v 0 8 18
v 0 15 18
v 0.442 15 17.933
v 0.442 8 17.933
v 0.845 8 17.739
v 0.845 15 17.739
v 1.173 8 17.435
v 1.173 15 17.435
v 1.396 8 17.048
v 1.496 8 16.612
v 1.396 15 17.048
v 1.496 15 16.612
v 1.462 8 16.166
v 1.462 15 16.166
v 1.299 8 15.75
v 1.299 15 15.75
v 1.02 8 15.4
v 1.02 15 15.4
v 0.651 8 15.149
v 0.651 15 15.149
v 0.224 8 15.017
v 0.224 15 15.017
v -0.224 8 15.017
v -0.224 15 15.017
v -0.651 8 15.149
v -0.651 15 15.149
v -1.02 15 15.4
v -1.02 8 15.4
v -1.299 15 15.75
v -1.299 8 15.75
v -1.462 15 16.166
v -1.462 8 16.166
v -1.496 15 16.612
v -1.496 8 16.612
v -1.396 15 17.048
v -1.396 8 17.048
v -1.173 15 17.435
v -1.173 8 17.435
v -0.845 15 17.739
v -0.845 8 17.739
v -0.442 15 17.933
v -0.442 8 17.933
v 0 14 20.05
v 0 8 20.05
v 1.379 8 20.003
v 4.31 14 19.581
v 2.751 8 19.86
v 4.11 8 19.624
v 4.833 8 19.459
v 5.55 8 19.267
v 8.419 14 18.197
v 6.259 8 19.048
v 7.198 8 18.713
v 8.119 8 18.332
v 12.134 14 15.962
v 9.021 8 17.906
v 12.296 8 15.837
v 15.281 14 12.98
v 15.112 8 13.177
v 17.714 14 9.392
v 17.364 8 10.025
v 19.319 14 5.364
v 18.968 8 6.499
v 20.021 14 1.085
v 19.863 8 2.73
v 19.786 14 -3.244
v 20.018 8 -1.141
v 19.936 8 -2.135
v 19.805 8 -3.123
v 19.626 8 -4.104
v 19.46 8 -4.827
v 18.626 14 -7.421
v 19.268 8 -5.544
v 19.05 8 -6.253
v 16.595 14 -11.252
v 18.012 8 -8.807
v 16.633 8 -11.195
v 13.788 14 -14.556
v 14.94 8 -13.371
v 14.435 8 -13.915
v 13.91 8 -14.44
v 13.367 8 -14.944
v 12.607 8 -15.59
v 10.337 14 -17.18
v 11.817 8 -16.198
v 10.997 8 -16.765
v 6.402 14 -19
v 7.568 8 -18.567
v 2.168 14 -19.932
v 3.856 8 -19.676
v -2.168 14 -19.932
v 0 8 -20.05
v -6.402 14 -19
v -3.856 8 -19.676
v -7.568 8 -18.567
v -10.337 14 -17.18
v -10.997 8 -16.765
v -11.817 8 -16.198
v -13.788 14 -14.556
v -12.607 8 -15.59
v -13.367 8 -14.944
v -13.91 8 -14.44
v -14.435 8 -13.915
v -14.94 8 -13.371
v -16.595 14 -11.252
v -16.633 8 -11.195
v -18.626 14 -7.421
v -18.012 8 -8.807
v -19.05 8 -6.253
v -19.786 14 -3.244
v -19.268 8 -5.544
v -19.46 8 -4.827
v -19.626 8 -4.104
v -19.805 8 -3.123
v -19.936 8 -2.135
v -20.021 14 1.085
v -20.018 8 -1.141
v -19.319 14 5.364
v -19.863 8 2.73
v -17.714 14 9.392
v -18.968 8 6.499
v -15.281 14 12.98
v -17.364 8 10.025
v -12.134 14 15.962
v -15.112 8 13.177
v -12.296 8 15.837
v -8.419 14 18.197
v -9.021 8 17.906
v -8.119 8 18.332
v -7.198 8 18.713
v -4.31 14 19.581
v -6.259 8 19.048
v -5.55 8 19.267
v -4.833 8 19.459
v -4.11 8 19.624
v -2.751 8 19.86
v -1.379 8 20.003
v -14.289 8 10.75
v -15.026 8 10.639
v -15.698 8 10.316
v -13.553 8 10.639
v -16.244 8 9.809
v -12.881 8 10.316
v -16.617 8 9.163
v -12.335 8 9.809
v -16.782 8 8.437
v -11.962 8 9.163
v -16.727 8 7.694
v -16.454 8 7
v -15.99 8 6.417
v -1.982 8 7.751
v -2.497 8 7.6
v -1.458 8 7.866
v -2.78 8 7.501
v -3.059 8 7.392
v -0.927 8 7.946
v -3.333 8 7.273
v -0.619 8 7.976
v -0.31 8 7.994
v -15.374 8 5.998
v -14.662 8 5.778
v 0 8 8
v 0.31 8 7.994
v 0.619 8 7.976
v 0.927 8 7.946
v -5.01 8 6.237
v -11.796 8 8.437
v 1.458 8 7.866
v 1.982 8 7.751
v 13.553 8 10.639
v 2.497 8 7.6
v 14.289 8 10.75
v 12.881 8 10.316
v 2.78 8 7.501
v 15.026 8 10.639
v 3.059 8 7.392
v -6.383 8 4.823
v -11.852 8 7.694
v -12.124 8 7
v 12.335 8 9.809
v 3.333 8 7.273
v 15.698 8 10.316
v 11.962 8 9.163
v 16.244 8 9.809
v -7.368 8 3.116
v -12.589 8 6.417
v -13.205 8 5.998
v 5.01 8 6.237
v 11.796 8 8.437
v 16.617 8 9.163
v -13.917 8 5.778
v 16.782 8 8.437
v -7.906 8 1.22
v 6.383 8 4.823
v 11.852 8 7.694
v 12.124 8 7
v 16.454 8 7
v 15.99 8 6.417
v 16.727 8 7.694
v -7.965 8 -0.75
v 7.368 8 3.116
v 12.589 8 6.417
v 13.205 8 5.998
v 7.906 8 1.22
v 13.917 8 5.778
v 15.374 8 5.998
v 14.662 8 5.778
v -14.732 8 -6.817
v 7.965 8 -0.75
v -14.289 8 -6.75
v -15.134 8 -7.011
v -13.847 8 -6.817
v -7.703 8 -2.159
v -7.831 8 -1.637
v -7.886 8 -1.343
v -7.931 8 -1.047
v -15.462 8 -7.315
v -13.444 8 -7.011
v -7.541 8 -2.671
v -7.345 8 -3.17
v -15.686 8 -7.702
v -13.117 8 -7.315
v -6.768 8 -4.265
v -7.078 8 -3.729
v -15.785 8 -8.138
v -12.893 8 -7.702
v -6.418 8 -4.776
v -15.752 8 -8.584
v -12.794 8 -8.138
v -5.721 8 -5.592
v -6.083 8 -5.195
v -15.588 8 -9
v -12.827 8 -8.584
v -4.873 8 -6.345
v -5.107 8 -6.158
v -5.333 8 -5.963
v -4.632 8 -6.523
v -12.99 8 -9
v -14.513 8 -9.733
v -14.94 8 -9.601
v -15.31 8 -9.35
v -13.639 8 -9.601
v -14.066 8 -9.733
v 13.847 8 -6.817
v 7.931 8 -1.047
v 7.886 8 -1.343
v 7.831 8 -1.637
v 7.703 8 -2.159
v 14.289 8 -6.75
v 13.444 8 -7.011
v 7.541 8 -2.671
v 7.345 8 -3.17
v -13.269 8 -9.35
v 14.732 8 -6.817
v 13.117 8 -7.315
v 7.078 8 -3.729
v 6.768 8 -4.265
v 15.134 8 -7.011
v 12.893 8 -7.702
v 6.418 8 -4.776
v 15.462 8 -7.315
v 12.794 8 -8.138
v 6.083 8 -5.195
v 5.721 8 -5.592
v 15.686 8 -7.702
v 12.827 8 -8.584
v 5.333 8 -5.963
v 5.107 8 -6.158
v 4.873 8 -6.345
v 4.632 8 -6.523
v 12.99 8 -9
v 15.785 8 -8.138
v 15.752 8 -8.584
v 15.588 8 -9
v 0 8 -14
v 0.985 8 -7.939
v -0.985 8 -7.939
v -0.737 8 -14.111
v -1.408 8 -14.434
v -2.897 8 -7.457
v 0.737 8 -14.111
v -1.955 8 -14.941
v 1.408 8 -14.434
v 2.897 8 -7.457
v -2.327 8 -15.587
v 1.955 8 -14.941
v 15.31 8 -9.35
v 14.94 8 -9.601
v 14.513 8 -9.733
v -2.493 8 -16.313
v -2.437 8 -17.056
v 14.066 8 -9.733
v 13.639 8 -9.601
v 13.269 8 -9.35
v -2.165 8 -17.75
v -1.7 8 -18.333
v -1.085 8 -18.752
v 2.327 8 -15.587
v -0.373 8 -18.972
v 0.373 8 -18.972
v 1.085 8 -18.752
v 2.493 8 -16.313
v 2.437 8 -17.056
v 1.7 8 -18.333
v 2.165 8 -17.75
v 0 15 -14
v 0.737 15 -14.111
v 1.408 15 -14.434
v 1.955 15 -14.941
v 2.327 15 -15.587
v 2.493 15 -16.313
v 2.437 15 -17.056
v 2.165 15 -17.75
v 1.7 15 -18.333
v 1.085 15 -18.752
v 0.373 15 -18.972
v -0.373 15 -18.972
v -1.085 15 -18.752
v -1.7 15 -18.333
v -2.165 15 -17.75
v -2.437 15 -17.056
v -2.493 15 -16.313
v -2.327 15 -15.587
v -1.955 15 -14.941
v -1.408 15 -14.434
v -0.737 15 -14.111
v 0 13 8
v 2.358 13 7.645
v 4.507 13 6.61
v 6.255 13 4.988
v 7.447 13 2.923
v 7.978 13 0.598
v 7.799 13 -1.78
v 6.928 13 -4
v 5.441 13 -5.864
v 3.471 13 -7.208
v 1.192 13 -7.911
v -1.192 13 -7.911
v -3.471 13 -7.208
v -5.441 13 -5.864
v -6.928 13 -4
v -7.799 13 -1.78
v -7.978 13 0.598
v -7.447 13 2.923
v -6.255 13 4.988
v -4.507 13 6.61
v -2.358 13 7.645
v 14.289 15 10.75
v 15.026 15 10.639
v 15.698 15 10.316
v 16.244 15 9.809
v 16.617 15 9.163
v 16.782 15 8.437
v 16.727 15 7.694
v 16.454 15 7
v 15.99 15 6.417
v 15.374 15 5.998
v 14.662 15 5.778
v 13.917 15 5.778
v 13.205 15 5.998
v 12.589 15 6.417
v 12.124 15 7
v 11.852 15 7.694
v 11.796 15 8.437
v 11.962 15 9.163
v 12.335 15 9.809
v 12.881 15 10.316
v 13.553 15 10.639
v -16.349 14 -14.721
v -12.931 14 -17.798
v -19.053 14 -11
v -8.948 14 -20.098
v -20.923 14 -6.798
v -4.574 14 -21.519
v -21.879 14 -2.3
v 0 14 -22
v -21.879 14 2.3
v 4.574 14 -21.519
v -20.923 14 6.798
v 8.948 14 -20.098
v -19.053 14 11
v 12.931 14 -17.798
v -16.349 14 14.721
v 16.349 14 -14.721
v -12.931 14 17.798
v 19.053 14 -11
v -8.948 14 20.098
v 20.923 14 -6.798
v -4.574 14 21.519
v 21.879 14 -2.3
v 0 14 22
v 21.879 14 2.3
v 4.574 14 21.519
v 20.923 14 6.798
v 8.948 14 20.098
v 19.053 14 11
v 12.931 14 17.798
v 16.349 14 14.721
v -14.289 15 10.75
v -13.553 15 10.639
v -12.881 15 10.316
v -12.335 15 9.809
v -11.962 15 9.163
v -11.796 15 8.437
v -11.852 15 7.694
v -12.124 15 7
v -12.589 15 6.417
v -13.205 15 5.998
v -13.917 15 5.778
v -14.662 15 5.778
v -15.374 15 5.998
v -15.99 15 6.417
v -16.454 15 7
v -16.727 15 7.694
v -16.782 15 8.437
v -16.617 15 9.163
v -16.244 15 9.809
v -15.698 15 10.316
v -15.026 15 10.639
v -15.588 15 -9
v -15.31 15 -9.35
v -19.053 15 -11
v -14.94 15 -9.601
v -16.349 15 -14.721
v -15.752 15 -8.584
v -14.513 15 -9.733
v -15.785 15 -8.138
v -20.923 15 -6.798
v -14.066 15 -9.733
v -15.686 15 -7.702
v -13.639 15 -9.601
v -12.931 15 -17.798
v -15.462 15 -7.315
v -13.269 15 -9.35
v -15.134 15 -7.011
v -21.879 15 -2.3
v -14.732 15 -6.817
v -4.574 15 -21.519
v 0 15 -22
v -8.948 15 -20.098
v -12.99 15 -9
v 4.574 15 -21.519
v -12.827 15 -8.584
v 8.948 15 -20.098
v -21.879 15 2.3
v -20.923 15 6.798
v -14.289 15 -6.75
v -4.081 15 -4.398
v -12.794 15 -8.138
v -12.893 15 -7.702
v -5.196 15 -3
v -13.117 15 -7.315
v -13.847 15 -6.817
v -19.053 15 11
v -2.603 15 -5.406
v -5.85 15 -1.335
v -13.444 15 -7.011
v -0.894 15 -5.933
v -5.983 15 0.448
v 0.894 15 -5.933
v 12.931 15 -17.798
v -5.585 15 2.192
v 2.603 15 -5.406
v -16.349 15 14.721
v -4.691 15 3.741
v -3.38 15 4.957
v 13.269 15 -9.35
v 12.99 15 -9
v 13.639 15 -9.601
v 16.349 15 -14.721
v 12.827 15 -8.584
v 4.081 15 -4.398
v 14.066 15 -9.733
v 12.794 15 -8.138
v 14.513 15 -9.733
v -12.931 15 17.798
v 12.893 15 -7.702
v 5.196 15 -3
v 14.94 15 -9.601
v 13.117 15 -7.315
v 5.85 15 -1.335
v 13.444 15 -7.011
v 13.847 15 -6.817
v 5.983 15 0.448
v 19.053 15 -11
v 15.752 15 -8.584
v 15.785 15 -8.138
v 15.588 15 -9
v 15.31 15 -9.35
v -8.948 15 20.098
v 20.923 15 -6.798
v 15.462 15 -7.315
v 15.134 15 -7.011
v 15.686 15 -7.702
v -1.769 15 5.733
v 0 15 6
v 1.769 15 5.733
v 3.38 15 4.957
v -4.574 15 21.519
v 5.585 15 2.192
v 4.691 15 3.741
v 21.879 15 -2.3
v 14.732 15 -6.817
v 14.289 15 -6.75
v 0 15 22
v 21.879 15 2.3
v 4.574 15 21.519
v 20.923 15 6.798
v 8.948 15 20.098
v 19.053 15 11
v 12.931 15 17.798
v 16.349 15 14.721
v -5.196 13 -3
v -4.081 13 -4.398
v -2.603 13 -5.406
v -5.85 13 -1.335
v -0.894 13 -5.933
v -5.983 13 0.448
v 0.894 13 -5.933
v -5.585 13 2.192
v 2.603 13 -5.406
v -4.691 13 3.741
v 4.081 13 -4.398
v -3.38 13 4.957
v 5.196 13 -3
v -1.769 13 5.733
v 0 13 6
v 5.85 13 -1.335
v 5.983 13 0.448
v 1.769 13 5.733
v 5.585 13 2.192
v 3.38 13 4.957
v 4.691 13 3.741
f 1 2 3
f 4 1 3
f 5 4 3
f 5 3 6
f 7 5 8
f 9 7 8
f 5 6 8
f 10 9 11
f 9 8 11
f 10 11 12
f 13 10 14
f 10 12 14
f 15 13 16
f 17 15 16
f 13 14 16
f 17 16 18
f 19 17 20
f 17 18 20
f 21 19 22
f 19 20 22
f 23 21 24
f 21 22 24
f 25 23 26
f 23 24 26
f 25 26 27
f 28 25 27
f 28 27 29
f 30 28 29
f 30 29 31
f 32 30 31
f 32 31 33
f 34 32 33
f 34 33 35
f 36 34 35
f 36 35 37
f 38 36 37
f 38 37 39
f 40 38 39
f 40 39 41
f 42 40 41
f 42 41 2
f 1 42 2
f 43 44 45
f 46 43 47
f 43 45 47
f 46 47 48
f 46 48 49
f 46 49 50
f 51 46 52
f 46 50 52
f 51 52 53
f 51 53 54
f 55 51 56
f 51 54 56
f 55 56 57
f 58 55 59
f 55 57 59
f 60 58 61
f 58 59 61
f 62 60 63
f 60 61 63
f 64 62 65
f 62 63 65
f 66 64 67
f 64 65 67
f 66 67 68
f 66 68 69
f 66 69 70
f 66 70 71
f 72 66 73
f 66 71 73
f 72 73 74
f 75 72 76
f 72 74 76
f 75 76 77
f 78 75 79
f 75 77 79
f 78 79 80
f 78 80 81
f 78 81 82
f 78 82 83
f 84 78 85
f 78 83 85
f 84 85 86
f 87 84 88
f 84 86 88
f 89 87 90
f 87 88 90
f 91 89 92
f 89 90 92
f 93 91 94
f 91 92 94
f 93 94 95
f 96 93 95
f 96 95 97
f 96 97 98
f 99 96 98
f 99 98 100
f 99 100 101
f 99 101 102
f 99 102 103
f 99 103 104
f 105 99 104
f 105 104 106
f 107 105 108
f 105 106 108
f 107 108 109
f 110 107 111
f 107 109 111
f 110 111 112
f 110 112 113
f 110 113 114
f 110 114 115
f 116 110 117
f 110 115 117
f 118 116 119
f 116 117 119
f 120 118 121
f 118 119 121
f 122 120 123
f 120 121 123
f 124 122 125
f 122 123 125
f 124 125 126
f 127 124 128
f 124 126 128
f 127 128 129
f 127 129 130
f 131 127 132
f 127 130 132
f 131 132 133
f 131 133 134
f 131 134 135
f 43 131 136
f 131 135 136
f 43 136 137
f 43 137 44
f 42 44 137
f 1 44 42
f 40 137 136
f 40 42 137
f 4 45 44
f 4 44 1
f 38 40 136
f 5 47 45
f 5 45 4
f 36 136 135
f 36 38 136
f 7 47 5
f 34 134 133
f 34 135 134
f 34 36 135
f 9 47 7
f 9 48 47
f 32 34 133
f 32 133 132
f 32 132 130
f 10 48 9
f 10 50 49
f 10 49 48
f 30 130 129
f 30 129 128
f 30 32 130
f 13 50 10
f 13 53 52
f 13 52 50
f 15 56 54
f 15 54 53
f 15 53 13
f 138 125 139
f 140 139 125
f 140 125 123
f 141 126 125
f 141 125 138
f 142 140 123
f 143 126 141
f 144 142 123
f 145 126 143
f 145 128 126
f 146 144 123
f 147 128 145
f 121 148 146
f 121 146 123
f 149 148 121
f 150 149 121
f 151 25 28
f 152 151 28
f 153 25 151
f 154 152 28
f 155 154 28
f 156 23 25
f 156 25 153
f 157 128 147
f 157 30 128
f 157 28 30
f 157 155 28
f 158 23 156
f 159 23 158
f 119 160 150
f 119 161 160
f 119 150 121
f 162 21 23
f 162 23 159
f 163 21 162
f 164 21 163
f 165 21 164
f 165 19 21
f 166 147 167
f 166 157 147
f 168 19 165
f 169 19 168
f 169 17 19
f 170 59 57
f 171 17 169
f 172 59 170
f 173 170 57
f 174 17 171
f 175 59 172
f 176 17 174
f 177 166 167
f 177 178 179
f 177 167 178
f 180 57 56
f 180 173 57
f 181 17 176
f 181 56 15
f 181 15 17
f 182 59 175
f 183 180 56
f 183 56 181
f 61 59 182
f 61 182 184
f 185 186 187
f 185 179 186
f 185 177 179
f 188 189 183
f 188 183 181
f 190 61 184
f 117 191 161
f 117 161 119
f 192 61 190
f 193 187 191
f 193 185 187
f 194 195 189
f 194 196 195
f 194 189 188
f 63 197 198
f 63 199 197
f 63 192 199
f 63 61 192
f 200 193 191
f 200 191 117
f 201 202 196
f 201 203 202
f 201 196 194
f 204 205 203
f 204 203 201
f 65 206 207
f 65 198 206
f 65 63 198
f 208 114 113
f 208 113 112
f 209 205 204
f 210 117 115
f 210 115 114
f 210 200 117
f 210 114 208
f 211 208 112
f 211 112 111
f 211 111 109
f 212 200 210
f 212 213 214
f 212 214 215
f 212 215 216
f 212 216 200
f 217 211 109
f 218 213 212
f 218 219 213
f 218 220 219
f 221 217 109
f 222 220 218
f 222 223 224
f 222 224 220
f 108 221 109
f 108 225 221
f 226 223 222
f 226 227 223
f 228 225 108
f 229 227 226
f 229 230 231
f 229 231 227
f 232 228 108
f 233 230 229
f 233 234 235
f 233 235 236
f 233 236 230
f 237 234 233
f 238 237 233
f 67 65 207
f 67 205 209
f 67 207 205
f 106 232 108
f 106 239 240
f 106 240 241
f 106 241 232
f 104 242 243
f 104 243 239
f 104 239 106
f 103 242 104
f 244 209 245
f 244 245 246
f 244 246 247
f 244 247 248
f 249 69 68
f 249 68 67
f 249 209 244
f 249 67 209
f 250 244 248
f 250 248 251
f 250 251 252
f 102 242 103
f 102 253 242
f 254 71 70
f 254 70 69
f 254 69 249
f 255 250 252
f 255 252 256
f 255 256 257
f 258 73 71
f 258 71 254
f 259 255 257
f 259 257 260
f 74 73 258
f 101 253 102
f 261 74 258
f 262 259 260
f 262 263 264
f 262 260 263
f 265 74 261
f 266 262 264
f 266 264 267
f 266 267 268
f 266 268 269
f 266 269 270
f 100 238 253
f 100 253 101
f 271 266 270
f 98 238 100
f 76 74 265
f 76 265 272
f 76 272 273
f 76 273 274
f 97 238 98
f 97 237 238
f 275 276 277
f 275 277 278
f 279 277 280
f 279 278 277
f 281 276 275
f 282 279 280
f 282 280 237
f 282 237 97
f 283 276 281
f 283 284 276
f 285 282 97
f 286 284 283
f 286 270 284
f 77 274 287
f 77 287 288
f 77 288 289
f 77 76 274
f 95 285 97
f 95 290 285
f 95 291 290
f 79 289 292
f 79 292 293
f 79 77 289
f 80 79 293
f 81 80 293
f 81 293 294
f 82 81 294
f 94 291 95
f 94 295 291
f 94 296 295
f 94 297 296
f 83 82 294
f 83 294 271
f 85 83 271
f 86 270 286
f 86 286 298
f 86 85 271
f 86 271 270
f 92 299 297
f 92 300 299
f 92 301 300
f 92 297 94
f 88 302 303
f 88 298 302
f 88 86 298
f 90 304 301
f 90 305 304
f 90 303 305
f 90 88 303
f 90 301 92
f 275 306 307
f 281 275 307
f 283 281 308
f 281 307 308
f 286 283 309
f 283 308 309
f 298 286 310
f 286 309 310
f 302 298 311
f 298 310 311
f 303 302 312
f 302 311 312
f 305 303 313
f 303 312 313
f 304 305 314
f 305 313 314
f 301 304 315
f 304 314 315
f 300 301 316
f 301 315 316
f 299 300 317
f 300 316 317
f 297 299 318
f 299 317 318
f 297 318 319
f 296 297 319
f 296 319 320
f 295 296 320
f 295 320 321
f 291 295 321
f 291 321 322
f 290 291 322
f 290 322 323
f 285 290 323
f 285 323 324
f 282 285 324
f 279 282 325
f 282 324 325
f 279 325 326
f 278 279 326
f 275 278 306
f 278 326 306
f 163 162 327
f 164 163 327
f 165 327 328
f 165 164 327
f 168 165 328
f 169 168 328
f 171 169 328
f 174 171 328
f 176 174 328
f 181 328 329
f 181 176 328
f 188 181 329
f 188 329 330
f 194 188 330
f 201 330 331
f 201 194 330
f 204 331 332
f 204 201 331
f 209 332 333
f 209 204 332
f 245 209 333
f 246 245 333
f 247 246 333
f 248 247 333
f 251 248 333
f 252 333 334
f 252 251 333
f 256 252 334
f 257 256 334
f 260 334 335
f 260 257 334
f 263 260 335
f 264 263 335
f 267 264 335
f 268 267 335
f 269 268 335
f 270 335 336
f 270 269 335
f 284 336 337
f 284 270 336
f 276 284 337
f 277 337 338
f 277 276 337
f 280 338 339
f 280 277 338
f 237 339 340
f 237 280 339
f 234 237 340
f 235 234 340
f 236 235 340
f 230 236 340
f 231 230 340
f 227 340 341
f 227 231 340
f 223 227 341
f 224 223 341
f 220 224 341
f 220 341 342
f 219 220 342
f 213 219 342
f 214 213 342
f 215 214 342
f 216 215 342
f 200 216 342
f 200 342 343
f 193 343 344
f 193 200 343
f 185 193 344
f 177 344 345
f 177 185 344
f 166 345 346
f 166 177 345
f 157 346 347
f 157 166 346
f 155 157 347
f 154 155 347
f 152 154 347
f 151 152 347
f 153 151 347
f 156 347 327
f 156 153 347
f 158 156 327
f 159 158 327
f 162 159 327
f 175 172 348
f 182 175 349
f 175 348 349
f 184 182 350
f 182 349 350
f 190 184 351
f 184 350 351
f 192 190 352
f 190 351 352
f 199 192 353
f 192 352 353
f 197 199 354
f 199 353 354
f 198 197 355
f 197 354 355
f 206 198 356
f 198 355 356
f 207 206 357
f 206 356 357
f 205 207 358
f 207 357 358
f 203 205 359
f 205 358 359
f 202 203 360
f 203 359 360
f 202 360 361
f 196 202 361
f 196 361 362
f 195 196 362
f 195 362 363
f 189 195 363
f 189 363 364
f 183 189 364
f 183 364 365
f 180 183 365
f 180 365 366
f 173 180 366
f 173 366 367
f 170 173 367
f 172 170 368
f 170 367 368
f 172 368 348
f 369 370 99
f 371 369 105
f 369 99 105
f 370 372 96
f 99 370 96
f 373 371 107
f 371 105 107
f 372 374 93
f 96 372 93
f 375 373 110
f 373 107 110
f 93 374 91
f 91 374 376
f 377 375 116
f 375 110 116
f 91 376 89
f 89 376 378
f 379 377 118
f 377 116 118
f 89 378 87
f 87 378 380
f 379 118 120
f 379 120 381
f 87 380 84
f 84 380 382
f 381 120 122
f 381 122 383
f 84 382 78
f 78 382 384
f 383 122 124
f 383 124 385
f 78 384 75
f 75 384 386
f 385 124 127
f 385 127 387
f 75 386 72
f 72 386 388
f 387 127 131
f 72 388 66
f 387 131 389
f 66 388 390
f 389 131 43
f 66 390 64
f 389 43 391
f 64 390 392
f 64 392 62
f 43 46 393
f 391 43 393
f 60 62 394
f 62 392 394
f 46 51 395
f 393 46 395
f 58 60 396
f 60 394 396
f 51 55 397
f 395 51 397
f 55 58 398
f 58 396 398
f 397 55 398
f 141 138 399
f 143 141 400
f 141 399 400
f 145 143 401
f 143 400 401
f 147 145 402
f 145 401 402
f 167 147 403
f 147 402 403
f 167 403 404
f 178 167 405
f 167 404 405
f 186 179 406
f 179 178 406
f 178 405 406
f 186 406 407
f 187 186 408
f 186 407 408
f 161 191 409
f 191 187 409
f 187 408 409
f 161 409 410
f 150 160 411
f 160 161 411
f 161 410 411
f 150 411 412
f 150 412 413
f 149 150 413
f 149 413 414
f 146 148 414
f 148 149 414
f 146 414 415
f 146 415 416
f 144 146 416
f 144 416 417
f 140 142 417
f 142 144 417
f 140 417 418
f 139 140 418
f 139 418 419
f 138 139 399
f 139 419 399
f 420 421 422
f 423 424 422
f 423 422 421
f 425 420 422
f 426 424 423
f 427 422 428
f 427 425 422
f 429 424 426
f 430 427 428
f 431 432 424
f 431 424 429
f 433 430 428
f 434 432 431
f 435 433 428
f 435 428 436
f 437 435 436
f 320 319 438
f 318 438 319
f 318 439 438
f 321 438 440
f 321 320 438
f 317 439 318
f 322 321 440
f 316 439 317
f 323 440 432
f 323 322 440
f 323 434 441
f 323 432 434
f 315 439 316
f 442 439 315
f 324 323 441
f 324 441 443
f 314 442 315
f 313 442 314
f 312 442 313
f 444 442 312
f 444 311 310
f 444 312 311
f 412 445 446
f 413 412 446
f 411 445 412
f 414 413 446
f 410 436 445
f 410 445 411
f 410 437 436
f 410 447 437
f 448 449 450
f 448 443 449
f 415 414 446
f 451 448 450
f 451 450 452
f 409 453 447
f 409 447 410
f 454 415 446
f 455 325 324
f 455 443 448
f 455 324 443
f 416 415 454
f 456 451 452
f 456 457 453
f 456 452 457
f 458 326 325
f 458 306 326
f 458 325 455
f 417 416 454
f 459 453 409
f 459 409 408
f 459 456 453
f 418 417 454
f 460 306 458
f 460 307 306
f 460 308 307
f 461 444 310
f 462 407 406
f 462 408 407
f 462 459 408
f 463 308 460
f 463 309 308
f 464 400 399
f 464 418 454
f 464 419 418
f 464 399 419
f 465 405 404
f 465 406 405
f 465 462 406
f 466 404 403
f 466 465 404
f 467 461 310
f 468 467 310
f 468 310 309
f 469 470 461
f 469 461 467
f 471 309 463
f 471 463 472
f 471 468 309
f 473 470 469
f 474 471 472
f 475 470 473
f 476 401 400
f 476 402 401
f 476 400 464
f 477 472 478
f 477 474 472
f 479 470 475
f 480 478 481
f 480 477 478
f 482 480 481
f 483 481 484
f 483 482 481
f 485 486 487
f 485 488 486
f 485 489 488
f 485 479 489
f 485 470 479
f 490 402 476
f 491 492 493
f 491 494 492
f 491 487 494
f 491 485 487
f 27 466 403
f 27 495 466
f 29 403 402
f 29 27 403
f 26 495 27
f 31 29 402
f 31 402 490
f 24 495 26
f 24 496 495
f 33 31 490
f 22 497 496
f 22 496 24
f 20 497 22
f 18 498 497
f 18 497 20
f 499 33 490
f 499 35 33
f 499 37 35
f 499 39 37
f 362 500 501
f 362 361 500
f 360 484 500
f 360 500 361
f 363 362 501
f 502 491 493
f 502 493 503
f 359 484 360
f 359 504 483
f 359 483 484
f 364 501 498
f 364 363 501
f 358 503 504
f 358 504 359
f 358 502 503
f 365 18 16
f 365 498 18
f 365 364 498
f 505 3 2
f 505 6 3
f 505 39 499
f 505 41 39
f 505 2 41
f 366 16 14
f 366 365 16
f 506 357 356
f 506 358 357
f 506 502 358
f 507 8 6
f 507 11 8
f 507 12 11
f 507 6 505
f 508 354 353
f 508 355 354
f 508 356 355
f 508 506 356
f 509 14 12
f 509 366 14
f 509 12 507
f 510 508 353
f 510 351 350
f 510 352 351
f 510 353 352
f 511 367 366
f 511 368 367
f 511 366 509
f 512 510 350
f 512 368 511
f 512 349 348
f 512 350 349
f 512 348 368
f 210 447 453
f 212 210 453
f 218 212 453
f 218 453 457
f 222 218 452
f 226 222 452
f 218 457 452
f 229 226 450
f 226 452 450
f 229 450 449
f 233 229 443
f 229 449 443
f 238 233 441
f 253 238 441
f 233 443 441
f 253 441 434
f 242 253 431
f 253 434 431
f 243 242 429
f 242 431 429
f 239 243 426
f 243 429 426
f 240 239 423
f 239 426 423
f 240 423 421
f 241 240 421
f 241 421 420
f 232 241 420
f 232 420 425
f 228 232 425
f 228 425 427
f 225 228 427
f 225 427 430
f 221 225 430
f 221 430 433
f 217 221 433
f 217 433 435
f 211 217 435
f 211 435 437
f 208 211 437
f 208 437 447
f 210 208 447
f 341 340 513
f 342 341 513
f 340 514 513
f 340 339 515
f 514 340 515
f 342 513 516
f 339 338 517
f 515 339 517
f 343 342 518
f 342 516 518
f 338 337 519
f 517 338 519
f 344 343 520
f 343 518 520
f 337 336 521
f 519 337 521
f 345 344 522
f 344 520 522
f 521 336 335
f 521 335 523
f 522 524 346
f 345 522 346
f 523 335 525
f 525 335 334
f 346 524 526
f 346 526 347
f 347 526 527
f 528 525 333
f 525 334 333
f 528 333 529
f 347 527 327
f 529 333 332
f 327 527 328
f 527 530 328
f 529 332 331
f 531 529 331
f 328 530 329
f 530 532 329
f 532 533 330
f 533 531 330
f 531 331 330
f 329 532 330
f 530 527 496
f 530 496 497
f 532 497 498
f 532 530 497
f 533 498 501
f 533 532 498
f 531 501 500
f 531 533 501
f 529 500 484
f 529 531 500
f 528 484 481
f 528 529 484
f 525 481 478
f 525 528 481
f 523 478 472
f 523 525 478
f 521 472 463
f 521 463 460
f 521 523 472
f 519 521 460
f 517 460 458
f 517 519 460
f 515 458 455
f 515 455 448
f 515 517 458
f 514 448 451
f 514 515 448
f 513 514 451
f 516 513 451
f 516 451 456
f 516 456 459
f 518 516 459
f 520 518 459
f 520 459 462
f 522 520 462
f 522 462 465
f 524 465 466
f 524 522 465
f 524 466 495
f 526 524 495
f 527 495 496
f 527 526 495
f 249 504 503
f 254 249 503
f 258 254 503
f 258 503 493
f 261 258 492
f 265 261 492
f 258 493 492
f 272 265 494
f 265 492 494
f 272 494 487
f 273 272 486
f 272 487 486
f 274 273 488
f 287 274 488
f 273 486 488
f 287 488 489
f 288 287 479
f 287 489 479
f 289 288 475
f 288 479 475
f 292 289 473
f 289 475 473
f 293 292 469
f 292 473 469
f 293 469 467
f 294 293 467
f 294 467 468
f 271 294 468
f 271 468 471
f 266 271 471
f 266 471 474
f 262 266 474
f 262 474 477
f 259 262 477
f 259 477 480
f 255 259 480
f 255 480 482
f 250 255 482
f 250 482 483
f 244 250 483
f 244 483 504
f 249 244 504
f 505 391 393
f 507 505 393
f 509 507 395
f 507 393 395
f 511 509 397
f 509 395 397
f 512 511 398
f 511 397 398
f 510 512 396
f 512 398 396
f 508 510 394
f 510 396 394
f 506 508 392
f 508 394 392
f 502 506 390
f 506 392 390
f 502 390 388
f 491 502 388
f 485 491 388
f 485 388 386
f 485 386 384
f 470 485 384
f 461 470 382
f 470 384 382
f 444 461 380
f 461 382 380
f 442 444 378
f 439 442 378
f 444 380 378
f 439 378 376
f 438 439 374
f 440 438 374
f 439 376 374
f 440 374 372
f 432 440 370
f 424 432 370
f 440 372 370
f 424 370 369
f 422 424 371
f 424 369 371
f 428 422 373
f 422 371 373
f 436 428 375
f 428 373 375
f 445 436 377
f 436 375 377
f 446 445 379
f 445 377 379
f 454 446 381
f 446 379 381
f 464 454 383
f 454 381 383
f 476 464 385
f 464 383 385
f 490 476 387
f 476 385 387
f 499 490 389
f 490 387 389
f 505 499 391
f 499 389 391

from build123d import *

# Parameters (mm, degrees)
SKETCH1_R           = 20.05
SKETCH1_R_2         = 8
BOSS_EXTRUDE1_DEPTH = 8
SKETCH2_R           = 20.05
SKETCH2_R_2         = 8
SKETCH2_R_3         = 20
BOSS_EXTRUDE2_DEPTH = 7
BOSS_EXTRUDE3_START = -2
SKETCH3_R           = 8
SKETCH3_R_2         = 6
BOSS_EXTRUDE3_DEPTH = 2
SKETCH4_R           = 2.5
SKETCH4_R_2         = 1.5
CUT_EXTRUDE1_DEPTH  = 33.0781078
SKETCH5_R           = 2.5
CUT_EXTRUDE2_DEPTH  = 8
CIRPATTERN1_COUNT   = 3
FILLET1_R           = 2
BOSS_EXTRUDE4_START = -1
SKETCH6_R           = 22
SKETCH6_R_2         = 20.05
BOSS_EXTRUDE4_DEPTH = 1
SKETCH7_R           = 2.5
CUT_EXTRUDE3_DEPTH  = 33.124756808


with BuildPart() as part:
    # Sketch1 → Boss-Extrude1 (new body)
    with BuildSketch(Plane(origin=(0, 0, 0), x_dir=(1, 0, 0), z_dir=(0, 1, 0))):
        with Locations(Location((0, 0, 0), (0, 0, 270))):
            Circle(SKETCH1_R)
        with Locations(Location((0, 0, 0), (0, 0, 270))):
            Circle(SKETCH1_R_2, mode=Mode.SUBTRACT)
    extrude(amount=BOSS_EXTRUDE1_DEPTH)

    # Sketch2 → Boss-Extrude2 (add)
    # profile 1 of 2: a face of its own
    with BuildSketch(Plane(origin=(0, 8, 0), x_dir=(1, 0, 0), z_dir=(0, 1, 0))):
        with Locations(Location((0, 0, 0), (0, 0, 270))):
            Circle(SKETCH2_R)
        with Locations(Location((0, 0, 0), (0, 0, 270))):
            Circle(SKETCH2_R_2, mode=Mode.SUBTRACT)
    # profile 2 of 2: a face of its own
    with BuildSketch(Plane(origin=(0, 8, 0), x_dir=(1, 0, 0), z_dir=(0, 1, 0))):
        with Locations(Location((0, 0, 0), (0, 0, 270))):
            Circle(SKETCH2_R)
        Circle(SKETCH2_R_3, mode=Mode.SUBTRACT)
    extrude(amount=BOSS_EXTRUDE2_DEPTH)

    # Sketch3 → Boss-Extrude3 (add)
    with BuildSketch(Plane(origin=(0, 15, 0), x_dir=(1, 0, 0), z_dir=(0, 1, 0)).offset(BOSS_EXTRUDE3_START)):
        with Locations(Location((0, 0, 0), (0, 0, 270))):
            Circle(SKETCH3_R)
        with Locations(Location((0, 0, 0), (0, 0, 270))):
            Circle(SKETCH3_R_2, mode=Mode.SUBTRACT)
    extrude(amount=BOSS_EXTRUDE3_DEPTH)

    # Sketch4 → Cut-Extrude1 (cut, through all)
    with BuildSketch(Plane(origin=(0, 15, 0), x_dir=(1, 0, 0), z_dir=(0, 1, 0))):
        with Locations(Location((0, 16.5, 0), (0, 0, 270))):
            Circle(SKETCH4_R)
        with Locations(Location((14.289419162, -8.25, 0), (0, 0, 270))):
            Circle(SKETCH4_R)
        with Locations(Location((-14.289419162, -8.25, 0), (0, 0, 270))):
            Circle(SKETCH4_R)
        with Locations(Location((0, -16.5, 0), (0, 0, 270))):
            Circle(SKETCH4_R_2)
        with Locations(Location((-14.289419162, 8.25, 0), (0, 0, 270))):
            Circle(SKETCH4_R_2)
        with Locations(Location((14.289419162, 8.25, 0), (0, 0, 270))):
            Circle(SKETCH4_R_2)
    extrude(amount=-CUT_EXTRUDE1_DEPTH, mode=Mode.SUBTRACT)

    # Sketch5 → Cut-Extrude2 (cut)
    with BuildSketch(Plane.XZ):
        with BuildLine():
            ThreePointArc((-3.332922817, 7.272662889), (-2.919714264, 7.448172166), (-2.497311128, 7.600226124))
            Line((-2.497311128, 7.600226124), (-6.258886015, 19.048066722))
            ThreePointArc((-6.258886015, 19.048066722), (-7.661105353, 18.52862555), (-9.020711712, 17.906123539))
            ThreePointArc((-9.020711712, 17.906123539), (-17.363809346, 10.025), (-20.017513724, -1.140896267))
            ThreePointArc((-20.017513724, -1.140896267), (-19.8768131, -2.629600918), (-19.625552682, -4.103679072))
            Line((-19.625552682, -4.103679072), (-7.830644462, -1.637378184))
            ThreePointArc((-7.830644462, -1.637378184), (-7.91016344, -1.195539359), (-7.964772223, -0.749935616))
            ThreePointArc((-7.964772223, -0.749935616), (-6.92820323, 4), (-3.332922817, 7.272662889))
        make_face()
        with Locations(Location((-14.289419162, 8.25, 0), (0, 0, 90))):
            Circle(SKETCH5_R, mode=Mode.SUBTRACT)
    cut_extrude2 = extrude(amount=-CUT_EXTRUDE2_DEPTH, mode=Mode.SUBTRACT)

    # CirPattern1: Cut-Extrude2 ×3 about axis
    cirpattern1_axis = Axis((0, 0, 0), (0, 1, 0))
    for i in range(1, CIRPATTERN1_COUNT):
        add(cut_extrude2.rotate(cirpattern1_axis, i * 360 / CIRPATTERN1_COUNT), mode=Mode.SUBTRACT)

    # Fillet1
    fillet1_edges = [part.edges().sort_by_distance(p)[0] for p in [
        (-7.830644462, 4, -1.637378184),
        (-19.625552682, 4, -4.103679072),
        (-6.258886015, 4, 19.048066722),
        (-2.497311128, 4, 7.600226124),
        (2.497311128, 4, 7.600226124),
        (6.258886015, 4, 19.048066722),
        (19.625552682, 4, -4.103679072),
        (7.830644462, 4, -1.637378184),
        (5.333333333, 4, -5.96284794),
        (13.366666667, 4, -14.94438765),
        (-13.366666667, 4, -14.94438765),
        (-5.333333333, 4, -5.96284794),
    ]]
    fillet(fillet1_edges, radius=FILLET1_R)

    # Sketch6 → Boss-Extrude4 (add)
    with BuildSketch(Plane(origin=(0, 15, 0), x_dir=(1, 0, 0), z_dir=(0, 1, 0)).offset(BOSS_EXTRUDE4_START)):
        with Locations(Location((0, 0, 0), (0, 0, 270))):
            Circle(SKETCH6_R)
        with Locations(Location((0, 0, 0), (0, 0, 41.828059361))):
            Circle(SKETCH6_R_2, mode=Mode.SUBTRACT)
    extrude(amount=BOSS_EXTRUDE4_DEPTH)

    # Sketch7 → Cut-Extrude3 (cut, through all)
    # profile 1 of 2: a face of its own
    with BuildSketch(Plane.XZ.offset(-8)):
        with BuildLine():
            ThreePointArc((4.109756896, 19.624280834), (5.43201172, 18.666478367), (5.599862615, 17.042418804))
            Line((5.599862615, 17.042418804), (3.058568997, 9.308337966))
            ThreePointArc((3.058568997, 9.308337966), (2.235430366, 8.247362264), (0.926809973, 7.946132599))
            ThreePointArc((0.926809973, 7.946132599), (6.92820323, 4), (7.344957679, -3.170425319))
            ThreePointArc((7.344957679, -3.170425319), (8.260140418, -2.187741646), (9.590541644, -2.005370533))
            Line((9.590541644, -2.005370533), (17.559098934, -3.67158612))
            ThreePointArc((17.559098934, -3.67158612), (18.881650325, -4.62897904), (19.050004181, -6.252986541))
            ThreePointArc((19.050004181, -6.252986541), (17.363809346, 10.025), (4.109756896, 19.624280834))
        make_face()
        with Locations(Location((14.289419162, 8.25, 0), (0, 0, 90))):
            Circle(SKETCH7_R, mode=Mode.SUBTRACT)
    # profile 2 of 2: a face of its own
    with BuildSketch(Plane.XZ.offset(-8)):
        with BuildLine():
            ThreePointArc((5.599862615, 17.042418804), (5.43201172, 18.666478367), (4.109756896, 19.624280834))
            ThreePointArc((4.109756896, 19.624280834), (-17.363809346, -10.025), (19.050004181, -6.252986541))
            ThreePointArc((19.050004181, -6.252986541), (18.881650325, -4.62897904), (17.559098934, -3.67158612))
            Line((17.559098934, -3.67158612), (9.590541644, -2.005370533))
            ThreePointArc((9.590541644, -2.005370533), (8.260140418, -2.187741646), (7.344957679, -3.170425319))
            ThreePointArc((7.344957679, -3.170425319), (-6.92820323, -4), (0.926809973, 7.946132599))
            ThreePointArc((0.926809973, 7.946132599), (2.235430366, 8.247362264), (3.058568997, 9.308337966))
            Line((3.058568997, 9.308337966), (5.599862615, 17.042418804))
        make_face()
    extrude(amount=CUT_EXTRUDE3_DEPTH, mode=Mode.SUBTRACT)


solid = part.part
